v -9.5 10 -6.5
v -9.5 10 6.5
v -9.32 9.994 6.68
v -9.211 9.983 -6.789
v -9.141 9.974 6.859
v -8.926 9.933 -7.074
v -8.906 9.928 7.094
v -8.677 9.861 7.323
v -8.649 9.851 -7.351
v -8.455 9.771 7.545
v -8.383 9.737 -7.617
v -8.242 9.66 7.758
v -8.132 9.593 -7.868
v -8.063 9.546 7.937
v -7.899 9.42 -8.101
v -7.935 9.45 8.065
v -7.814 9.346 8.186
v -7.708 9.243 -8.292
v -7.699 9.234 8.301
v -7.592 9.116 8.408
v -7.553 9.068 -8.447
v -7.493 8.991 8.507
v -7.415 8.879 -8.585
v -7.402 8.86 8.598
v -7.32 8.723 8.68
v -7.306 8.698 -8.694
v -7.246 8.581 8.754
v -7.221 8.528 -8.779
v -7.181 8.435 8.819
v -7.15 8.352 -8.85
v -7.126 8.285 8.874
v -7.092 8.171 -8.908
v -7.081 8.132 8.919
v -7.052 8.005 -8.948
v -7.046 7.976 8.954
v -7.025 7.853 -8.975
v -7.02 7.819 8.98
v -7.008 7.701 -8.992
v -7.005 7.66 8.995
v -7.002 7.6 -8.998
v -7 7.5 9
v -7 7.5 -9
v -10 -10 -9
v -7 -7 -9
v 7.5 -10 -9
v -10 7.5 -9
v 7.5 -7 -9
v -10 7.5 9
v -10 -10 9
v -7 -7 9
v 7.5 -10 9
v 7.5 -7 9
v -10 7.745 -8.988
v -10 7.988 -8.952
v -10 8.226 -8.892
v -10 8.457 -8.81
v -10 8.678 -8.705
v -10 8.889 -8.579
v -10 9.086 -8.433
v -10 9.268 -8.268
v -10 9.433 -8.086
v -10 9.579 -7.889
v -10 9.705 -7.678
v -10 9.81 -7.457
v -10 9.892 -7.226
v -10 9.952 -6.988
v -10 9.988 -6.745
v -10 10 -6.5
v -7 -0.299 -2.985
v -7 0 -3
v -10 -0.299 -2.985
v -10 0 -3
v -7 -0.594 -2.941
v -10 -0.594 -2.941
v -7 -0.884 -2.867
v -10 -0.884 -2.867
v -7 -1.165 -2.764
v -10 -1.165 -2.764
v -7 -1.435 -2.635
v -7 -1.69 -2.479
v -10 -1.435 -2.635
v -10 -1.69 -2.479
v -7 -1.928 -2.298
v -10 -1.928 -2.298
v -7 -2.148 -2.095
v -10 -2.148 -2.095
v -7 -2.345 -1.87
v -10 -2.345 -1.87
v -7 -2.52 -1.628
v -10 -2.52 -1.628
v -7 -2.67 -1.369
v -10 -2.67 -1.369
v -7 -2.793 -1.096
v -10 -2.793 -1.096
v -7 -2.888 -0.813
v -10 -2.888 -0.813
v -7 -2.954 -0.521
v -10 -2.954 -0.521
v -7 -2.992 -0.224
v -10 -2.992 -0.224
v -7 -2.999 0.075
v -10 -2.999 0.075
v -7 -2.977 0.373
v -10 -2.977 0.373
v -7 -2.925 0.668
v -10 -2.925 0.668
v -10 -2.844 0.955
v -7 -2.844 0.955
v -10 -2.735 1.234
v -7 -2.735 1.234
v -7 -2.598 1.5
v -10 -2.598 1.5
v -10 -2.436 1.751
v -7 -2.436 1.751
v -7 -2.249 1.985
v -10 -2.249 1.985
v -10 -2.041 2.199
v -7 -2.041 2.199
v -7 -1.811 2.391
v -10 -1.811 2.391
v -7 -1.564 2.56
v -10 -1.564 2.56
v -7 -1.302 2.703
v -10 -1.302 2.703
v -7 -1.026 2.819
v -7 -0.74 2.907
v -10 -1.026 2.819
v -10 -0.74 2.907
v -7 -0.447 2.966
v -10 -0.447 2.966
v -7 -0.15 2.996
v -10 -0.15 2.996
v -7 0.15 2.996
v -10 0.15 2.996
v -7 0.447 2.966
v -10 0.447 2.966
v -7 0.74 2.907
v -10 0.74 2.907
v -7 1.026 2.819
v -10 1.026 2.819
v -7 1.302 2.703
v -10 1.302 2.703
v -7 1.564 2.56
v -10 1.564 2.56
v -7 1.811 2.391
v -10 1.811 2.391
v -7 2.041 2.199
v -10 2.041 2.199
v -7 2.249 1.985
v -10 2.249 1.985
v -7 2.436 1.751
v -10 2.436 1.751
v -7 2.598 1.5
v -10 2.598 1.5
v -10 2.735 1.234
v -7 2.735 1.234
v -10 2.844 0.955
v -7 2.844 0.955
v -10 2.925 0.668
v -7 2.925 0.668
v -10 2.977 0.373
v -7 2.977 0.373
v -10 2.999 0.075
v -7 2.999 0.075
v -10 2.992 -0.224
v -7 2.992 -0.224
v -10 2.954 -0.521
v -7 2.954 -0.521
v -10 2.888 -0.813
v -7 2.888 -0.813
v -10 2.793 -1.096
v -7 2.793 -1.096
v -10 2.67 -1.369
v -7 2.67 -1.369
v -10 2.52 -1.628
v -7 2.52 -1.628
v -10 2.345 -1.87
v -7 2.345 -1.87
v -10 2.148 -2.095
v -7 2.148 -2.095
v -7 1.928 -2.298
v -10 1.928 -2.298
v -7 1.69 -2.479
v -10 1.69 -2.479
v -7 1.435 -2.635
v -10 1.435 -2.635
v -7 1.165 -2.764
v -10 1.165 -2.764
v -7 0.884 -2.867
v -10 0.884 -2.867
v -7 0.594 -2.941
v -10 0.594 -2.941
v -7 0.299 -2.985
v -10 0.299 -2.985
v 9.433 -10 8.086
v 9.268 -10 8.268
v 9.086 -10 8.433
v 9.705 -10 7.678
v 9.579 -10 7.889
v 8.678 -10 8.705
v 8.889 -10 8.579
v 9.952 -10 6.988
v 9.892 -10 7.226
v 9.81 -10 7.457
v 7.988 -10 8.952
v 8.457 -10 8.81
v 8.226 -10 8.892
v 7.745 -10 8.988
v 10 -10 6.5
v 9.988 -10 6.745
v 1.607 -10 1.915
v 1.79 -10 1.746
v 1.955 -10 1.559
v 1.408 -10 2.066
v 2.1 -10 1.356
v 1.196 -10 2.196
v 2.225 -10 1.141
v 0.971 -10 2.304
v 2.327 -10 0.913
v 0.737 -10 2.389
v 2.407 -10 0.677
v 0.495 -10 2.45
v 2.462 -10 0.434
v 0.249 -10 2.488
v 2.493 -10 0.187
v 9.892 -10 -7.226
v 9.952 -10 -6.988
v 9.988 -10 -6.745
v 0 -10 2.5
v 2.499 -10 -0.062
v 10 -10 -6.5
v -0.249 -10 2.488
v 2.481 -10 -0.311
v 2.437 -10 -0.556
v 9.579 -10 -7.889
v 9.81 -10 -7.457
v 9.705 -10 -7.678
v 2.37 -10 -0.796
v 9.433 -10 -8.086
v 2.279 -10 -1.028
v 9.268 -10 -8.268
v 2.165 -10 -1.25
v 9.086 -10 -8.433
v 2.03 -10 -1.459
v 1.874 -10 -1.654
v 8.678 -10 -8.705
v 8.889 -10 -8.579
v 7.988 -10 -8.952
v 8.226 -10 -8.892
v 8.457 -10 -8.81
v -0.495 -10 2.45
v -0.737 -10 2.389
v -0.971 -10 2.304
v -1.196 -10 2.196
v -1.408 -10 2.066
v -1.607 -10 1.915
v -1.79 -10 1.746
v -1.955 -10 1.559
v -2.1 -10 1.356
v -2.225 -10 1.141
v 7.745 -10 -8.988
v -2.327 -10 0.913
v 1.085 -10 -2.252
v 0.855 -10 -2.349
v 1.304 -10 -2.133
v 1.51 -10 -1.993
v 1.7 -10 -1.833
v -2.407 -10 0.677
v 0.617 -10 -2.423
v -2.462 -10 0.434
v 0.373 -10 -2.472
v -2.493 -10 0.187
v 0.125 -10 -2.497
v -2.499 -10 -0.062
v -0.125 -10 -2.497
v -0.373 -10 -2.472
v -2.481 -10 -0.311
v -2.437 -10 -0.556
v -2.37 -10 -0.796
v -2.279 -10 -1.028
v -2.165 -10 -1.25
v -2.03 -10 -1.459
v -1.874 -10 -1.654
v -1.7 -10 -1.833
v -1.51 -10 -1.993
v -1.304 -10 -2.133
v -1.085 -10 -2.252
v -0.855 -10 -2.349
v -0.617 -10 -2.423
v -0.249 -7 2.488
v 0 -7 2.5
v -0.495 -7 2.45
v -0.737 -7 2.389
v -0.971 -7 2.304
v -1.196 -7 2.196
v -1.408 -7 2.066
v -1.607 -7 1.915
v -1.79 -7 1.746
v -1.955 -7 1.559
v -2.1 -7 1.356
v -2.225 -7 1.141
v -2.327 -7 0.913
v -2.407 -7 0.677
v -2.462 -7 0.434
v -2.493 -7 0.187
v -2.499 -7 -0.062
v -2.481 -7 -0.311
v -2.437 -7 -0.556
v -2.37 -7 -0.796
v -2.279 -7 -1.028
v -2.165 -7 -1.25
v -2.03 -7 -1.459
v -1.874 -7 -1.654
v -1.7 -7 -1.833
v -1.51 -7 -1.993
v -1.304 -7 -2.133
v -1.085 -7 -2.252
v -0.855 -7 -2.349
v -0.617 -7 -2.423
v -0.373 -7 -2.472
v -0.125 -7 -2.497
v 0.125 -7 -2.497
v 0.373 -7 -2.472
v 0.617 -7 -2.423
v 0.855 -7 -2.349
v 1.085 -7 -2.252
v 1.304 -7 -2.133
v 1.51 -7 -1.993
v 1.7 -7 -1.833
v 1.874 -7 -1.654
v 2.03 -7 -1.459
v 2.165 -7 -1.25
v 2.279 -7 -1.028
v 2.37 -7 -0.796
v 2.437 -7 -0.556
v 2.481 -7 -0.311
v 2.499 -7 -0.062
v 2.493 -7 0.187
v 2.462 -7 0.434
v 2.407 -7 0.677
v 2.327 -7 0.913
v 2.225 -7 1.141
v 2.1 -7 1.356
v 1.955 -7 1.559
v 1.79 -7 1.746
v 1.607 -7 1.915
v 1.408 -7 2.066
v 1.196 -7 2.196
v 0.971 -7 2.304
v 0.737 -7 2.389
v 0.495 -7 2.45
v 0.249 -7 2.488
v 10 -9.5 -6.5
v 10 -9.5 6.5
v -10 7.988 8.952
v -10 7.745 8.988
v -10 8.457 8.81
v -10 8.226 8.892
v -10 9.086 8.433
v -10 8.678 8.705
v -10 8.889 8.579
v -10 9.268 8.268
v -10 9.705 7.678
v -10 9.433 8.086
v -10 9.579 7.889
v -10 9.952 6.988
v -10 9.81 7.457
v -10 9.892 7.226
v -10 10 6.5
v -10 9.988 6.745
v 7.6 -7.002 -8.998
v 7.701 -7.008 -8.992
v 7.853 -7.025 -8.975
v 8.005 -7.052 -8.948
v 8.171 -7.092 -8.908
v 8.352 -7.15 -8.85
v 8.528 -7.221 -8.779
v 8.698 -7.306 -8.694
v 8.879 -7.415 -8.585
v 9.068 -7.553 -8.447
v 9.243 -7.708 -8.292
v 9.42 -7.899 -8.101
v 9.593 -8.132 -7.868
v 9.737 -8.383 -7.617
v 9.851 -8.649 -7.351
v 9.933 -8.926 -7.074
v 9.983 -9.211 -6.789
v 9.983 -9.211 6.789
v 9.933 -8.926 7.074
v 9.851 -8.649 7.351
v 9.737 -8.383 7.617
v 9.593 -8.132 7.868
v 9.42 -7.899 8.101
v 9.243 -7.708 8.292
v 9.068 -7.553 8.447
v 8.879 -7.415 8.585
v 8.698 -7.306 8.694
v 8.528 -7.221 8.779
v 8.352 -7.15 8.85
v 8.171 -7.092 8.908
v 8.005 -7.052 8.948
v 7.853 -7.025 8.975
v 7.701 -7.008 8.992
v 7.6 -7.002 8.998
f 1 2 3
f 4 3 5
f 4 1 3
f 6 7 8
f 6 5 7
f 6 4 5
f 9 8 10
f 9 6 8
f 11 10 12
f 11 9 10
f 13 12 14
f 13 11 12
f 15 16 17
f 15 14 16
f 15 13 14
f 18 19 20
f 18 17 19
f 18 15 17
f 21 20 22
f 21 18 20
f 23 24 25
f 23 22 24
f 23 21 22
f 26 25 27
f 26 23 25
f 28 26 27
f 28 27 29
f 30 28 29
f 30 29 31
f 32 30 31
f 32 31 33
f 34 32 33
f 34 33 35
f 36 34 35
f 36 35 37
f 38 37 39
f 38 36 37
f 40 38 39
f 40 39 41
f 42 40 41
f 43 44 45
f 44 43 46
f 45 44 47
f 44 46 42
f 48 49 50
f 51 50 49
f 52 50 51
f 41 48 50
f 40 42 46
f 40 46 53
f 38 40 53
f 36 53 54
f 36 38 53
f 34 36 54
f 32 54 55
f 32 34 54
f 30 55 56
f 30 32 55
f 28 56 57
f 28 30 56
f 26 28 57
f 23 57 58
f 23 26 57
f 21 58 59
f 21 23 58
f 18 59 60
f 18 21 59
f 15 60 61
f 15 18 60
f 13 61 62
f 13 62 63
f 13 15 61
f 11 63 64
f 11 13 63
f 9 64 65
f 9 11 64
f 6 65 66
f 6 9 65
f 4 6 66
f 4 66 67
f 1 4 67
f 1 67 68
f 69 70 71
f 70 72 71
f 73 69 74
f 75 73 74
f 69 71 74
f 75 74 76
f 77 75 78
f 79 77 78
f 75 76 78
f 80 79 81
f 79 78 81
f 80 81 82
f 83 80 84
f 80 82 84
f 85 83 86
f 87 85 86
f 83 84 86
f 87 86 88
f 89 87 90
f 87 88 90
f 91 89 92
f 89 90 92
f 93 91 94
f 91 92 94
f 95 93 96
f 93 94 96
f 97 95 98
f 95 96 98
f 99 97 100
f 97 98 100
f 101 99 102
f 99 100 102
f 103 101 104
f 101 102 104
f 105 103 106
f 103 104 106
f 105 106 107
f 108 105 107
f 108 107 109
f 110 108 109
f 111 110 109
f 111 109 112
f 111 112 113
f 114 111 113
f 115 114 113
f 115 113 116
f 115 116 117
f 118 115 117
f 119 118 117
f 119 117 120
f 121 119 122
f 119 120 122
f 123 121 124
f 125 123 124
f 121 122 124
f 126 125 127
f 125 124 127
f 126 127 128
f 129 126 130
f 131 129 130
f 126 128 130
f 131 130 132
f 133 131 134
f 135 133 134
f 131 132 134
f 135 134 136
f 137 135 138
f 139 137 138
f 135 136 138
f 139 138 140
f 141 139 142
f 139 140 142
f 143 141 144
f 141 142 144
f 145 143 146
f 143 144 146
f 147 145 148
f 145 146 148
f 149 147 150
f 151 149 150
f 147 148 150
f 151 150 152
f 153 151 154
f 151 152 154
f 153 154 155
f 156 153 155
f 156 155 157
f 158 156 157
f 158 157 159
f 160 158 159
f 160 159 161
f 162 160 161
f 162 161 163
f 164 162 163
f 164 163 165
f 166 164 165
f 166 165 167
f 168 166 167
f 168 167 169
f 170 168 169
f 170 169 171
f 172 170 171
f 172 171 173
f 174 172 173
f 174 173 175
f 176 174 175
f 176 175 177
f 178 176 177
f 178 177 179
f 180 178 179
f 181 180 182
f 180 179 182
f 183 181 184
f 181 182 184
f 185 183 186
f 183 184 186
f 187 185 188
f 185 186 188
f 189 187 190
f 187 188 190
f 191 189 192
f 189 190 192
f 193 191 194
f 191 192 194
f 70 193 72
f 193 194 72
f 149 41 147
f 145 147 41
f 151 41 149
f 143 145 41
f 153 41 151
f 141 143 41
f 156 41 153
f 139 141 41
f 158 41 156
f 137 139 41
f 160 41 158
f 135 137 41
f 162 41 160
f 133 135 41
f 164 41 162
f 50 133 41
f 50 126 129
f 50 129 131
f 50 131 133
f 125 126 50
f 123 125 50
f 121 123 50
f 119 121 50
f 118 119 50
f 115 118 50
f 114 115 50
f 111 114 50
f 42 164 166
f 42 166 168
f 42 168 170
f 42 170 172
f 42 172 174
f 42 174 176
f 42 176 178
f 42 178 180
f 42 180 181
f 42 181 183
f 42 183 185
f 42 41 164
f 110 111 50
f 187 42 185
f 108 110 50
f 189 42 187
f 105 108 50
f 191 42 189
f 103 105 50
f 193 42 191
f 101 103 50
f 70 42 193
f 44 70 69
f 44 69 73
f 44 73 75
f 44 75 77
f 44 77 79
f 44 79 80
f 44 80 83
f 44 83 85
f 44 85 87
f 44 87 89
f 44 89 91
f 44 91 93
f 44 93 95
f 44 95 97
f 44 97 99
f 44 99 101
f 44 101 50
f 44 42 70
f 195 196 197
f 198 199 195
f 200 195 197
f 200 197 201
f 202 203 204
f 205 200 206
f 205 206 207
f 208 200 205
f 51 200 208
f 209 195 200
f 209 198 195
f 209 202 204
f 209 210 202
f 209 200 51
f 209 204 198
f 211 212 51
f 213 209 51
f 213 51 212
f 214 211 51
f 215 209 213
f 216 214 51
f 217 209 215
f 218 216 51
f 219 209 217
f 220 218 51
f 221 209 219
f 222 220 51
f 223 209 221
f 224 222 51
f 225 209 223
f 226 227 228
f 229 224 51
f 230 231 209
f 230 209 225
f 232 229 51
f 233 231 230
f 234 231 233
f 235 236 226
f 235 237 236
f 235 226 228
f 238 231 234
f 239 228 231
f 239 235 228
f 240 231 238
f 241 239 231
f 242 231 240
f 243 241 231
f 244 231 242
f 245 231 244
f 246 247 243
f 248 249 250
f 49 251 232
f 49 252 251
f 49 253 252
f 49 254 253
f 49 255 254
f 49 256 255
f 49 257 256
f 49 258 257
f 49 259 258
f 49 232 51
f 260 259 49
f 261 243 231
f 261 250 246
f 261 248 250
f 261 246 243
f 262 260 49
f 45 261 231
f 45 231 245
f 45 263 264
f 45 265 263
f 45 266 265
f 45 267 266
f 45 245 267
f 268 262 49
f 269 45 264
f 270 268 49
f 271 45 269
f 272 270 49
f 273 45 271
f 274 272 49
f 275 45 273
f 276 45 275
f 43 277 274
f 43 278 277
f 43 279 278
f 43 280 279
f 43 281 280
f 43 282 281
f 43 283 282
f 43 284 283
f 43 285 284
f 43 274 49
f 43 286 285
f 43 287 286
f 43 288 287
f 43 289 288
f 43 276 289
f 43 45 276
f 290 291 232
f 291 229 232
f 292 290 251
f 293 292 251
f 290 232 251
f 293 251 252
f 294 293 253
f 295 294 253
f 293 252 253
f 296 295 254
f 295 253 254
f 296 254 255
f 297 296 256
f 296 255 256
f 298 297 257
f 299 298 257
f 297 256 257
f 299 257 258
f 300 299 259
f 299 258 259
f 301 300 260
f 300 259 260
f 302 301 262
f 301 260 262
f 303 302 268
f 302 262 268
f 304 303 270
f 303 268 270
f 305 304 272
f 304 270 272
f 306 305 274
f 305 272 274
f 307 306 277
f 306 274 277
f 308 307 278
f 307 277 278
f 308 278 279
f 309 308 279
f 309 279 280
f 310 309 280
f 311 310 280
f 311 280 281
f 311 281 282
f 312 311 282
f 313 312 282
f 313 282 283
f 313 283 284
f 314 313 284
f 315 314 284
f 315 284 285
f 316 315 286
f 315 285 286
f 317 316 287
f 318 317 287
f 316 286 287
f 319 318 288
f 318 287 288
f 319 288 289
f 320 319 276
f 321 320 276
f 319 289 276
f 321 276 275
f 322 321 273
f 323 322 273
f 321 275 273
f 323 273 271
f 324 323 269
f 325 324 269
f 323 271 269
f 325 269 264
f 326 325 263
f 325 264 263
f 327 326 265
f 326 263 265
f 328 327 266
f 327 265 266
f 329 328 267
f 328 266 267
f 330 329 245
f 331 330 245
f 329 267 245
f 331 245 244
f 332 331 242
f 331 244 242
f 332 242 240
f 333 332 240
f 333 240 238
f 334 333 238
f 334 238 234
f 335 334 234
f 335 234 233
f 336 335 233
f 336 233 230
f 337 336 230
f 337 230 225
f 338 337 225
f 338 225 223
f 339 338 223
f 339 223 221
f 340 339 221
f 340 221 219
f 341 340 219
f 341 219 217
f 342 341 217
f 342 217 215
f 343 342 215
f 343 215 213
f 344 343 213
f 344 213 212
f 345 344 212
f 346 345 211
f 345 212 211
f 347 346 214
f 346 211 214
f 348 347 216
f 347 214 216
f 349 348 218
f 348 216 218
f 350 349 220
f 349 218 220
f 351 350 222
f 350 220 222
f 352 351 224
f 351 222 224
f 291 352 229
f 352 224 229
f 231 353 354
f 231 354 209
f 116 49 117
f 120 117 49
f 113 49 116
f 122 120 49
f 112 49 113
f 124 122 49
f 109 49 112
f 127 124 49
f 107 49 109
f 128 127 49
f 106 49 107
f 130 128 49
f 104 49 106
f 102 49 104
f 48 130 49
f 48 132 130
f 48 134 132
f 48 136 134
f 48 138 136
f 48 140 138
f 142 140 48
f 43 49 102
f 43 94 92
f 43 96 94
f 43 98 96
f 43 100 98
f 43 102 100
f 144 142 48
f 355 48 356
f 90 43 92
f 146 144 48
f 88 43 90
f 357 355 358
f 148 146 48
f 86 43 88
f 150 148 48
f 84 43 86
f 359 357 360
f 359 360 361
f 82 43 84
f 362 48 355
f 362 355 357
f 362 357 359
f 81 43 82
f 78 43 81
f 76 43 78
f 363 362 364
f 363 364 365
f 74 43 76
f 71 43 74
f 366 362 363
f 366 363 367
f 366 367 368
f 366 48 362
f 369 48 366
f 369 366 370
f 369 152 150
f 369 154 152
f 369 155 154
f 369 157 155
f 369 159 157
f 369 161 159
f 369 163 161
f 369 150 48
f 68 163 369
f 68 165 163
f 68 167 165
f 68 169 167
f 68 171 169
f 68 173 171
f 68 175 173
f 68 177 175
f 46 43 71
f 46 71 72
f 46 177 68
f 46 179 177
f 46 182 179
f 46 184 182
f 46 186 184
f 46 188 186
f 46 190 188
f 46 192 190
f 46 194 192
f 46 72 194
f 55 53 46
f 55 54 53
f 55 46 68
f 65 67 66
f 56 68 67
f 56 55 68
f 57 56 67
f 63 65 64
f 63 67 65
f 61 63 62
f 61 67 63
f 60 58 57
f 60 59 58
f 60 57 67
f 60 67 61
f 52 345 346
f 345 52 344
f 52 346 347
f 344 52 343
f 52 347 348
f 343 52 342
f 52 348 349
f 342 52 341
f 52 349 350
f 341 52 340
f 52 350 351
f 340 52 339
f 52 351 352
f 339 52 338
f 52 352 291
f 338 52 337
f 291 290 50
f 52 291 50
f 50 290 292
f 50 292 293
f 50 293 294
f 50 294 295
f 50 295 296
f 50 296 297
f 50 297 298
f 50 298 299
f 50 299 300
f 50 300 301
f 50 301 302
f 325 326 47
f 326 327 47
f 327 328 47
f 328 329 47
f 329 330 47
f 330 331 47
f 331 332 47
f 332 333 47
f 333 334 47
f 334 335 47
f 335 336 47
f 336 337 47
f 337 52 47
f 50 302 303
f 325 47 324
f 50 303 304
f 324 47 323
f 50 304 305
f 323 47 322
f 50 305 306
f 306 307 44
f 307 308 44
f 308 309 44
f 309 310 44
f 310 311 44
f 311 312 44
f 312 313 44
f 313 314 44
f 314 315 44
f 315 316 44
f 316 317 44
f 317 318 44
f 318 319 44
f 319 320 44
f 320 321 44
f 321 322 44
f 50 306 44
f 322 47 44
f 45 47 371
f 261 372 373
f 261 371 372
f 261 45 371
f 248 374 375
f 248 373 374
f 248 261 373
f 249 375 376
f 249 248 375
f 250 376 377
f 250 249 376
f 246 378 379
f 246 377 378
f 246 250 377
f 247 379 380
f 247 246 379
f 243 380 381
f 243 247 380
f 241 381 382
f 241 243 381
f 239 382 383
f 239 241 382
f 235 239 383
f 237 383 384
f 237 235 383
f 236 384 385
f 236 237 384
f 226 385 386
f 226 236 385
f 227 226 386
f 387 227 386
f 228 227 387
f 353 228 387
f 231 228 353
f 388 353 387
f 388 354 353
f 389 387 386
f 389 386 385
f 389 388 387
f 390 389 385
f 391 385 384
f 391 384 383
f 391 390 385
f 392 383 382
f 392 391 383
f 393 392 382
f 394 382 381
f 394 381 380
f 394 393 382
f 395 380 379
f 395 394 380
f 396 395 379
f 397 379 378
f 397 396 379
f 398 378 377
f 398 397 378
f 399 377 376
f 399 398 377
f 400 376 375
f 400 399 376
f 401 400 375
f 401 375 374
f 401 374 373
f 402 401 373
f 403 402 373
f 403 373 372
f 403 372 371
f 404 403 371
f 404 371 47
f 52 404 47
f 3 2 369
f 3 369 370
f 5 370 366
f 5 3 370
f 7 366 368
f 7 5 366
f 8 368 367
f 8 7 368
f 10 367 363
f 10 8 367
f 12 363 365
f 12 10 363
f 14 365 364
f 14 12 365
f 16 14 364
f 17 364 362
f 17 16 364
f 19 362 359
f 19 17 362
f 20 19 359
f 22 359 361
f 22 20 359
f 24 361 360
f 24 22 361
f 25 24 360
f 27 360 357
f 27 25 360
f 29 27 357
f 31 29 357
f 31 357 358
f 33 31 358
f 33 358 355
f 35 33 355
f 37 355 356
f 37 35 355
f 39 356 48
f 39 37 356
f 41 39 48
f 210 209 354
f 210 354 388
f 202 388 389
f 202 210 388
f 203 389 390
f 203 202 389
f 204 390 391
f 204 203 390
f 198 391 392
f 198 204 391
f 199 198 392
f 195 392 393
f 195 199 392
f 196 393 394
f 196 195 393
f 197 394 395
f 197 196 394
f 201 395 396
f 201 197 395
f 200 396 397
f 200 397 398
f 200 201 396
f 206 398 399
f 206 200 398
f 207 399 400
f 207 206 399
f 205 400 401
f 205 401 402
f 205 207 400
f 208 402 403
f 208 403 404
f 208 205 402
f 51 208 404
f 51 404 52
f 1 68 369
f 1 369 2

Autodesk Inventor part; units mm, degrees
ref_plane "YZ Plane" through (0, 0, 0) normal (1, 0, 0) x (0, 1, 0)
ref_plane "XZ Plane" through (0, 0, 0) normal (0, 1, 0) x (-1, 0, 0)
ref_plane "XY Plane" through (0, 0, 0) normal (0, 0, 1) x (1, 0, 0)
sketch "Esboço1" plane through (0, 0, 0) normal (0, 0, 1) x (1, 0, 0)
  line L0 (10, -10) -> (-10, -10)
  line L1 (-10, -10) -> (-10, 10)
  line L2 (-10, 10) -> (-7, 10)
  line L3 (10, -7) -> (10, -10)
  line L4 (10, -10) -> (-10, 10) construction
  line L5 (-10, -10) -> (10, 10) construction
  line L6 (10, -7) -> (-7, -7)
  line L7 (-7, 10) -> (-7, -7)
  line L8 (-7, -10) -> (-7, -10.3421)
  point P0 (0, 0)
  dimension "d0" = 20
  dimension "d1" = 20
  dimension "d4" = 3
  dimension "d8" = 45
  dimension "d9" = 17
extrude "Extrusão1" add sketch "Esboço1" along normal mid plane 18
fillet "Arredondamento1" radius 2.5 6 edges at (-8.5, 10, 9) (-7, 10, 0) (-8.5, 10, -9) (10, -8.5, 9) (10, -7, 0) (10, -8.5, -9)
hole "Furo1" at (-7, 0, 0) direction (-1, 0, 0) diameter 6 end through all
hole "Furo2" at (0, -7, 0) direction (0, -1, 0) diameter 5 end through all
properties part number "Cantoneira" material "Cobre"
